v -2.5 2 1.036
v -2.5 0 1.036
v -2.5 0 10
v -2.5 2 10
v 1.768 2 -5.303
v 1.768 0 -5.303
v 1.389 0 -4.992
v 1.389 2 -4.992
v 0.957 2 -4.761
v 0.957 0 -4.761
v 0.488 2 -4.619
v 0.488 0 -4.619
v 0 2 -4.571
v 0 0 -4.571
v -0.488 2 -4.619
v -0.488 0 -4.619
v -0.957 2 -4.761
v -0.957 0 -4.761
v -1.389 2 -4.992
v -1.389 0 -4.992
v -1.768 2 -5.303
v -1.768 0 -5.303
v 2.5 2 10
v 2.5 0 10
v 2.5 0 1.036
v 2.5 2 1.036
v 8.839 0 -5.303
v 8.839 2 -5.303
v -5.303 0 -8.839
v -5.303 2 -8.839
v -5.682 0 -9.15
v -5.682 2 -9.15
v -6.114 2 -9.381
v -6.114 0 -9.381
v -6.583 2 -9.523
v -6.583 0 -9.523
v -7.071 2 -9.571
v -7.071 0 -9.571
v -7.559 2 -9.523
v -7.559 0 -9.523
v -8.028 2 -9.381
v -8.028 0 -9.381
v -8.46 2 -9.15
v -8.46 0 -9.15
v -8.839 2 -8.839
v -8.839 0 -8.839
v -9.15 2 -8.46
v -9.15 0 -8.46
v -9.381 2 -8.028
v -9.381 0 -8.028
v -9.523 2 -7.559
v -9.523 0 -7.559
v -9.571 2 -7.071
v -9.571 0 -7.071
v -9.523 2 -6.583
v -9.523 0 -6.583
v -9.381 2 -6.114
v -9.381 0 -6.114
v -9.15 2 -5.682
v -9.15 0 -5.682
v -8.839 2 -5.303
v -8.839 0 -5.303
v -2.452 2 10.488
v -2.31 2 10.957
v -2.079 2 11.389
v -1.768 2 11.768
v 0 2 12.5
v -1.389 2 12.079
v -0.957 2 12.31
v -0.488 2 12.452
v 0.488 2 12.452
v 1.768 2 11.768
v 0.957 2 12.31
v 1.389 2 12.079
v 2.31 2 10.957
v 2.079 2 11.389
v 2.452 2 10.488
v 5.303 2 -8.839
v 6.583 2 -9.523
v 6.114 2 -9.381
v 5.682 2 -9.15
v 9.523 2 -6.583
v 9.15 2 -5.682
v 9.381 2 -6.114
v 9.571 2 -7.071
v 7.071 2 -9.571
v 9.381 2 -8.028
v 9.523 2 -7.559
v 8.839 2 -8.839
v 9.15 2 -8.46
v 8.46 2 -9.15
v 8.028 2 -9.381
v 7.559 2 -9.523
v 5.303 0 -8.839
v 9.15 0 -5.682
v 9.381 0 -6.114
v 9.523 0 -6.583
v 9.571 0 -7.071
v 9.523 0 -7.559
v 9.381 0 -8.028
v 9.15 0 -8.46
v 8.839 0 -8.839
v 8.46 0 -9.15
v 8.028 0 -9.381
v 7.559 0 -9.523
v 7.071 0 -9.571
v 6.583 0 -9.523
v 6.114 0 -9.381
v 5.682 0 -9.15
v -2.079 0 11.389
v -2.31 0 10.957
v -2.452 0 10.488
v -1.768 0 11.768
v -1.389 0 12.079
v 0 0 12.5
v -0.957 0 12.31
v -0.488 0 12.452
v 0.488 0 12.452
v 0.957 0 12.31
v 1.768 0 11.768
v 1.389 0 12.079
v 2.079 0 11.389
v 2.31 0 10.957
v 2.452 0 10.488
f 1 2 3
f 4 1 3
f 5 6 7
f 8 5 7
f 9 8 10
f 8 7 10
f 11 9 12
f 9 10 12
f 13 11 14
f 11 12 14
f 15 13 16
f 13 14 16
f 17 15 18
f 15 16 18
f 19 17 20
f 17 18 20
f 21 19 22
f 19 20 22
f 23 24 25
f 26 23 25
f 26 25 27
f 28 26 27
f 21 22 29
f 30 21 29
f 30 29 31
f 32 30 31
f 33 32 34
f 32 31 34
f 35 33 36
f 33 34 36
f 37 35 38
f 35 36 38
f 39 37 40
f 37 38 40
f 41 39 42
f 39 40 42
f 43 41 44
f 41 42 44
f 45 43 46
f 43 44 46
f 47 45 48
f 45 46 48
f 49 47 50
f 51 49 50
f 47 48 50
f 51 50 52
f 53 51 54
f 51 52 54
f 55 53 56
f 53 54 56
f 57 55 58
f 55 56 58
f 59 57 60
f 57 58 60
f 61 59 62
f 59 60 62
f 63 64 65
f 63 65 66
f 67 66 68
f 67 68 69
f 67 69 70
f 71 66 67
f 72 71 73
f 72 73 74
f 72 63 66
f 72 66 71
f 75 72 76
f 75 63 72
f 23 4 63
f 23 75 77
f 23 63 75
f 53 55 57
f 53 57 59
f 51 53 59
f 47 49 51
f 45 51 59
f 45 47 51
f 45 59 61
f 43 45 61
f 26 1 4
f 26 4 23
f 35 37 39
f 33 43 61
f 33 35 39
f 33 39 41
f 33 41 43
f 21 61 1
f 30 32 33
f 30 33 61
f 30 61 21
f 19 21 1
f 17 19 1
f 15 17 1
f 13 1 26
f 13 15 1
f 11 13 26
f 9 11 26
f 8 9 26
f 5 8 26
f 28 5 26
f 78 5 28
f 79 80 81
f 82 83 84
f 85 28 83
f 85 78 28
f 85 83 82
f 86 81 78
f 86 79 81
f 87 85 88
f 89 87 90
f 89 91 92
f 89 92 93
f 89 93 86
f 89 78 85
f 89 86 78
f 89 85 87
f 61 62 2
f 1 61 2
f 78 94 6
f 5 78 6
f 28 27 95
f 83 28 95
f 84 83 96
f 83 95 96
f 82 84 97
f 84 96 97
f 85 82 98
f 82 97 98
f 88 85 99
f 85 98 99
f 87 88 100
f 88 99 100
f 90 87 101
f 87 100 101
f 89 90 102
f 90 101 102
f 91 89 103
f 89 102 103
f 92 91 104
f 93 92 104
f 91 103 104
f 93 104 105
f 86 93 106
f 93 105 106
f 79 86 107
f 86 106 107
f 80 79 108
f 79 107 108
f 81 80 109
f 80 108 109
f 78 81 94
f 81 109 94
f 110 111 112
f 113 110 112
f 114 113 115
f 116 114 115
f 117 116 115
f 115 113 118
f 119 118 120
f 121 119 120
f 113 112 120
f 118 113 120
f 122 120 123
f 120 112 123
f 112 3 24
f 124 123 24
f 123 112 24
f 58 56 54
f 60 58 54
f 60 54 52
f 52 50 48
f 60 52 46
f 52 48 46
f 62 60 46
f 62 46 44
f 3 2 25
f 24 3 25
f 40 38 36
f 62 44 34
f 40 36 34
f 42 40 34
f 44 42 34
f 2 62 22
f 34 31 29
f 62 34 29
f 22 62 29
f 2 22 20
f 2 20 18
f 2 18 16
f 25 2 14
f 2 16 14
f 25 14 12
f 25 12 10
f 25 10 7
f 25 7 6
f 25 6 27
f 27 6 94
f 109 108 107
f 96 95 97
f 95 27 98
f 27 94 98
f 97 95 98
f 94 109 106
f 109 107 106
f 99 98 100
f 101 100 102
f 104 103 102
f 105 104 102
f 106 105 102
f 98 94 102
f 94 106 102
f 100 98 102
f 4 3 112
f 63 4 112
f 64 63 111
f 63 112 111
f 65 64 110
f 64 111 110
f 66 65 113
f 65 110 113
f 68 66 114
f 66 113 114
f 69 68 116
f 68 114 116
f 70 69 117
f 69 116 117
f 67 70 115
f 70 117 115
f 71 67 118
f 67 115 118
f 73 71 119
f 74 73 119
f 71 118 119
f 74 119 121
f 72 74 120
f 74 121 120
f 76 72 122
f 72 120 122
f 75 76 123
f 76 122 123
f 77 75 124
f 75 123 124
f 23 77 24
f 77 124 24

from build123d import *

# Parameters (mm, degrees)
BOSS_EXTRUDE1_DEPTH = 2


with BuildPart() as part:
    # Sketch1 → Boss-Extrude1 (new body)
    with BuildSketch(Plane(origin=(0, 0, 0), x_dir=(1, 0, 0), z_dir=(0, 1, 0))):
        with BuildLine():
            Line((2.5, -10), (2.5, -1.035533906))
            Line((2.5, -1.035533906), (8.838834765, 5.303300859))
            ThreePointArc((8.838834765, 5.303300859), (8.838834765, 8.838834765), (5.303300859, 8.838834765))
            Line((5.303300859, 8.838834765), (1.767766953, 5.303300859))
            ThreePointArc((1.767766953, 5.303300859), (0, 4.571067812), (-1.767766953, 5.303300859))
            Line((-1.767766953, 5.303300859), (-5.303300859, 8.838834765))
            ThreePointArc((-5.303300859, 8.838834765), (-8.838834765, 8.838834765), (-8.838834765, 5.303300859))
            Line((-8.838834765, 5.303300859), (-2.5, -1.035533906))
            Line((-2.5, -1.035533906), (-2.5, -10))
            ThreePointArc((-2.5, -10), (0, -12.5), (2.5, -10))
        make_face()
    extrude(amount=BOSS_EXTRUDE1_DEPTH)


solid = part.part
